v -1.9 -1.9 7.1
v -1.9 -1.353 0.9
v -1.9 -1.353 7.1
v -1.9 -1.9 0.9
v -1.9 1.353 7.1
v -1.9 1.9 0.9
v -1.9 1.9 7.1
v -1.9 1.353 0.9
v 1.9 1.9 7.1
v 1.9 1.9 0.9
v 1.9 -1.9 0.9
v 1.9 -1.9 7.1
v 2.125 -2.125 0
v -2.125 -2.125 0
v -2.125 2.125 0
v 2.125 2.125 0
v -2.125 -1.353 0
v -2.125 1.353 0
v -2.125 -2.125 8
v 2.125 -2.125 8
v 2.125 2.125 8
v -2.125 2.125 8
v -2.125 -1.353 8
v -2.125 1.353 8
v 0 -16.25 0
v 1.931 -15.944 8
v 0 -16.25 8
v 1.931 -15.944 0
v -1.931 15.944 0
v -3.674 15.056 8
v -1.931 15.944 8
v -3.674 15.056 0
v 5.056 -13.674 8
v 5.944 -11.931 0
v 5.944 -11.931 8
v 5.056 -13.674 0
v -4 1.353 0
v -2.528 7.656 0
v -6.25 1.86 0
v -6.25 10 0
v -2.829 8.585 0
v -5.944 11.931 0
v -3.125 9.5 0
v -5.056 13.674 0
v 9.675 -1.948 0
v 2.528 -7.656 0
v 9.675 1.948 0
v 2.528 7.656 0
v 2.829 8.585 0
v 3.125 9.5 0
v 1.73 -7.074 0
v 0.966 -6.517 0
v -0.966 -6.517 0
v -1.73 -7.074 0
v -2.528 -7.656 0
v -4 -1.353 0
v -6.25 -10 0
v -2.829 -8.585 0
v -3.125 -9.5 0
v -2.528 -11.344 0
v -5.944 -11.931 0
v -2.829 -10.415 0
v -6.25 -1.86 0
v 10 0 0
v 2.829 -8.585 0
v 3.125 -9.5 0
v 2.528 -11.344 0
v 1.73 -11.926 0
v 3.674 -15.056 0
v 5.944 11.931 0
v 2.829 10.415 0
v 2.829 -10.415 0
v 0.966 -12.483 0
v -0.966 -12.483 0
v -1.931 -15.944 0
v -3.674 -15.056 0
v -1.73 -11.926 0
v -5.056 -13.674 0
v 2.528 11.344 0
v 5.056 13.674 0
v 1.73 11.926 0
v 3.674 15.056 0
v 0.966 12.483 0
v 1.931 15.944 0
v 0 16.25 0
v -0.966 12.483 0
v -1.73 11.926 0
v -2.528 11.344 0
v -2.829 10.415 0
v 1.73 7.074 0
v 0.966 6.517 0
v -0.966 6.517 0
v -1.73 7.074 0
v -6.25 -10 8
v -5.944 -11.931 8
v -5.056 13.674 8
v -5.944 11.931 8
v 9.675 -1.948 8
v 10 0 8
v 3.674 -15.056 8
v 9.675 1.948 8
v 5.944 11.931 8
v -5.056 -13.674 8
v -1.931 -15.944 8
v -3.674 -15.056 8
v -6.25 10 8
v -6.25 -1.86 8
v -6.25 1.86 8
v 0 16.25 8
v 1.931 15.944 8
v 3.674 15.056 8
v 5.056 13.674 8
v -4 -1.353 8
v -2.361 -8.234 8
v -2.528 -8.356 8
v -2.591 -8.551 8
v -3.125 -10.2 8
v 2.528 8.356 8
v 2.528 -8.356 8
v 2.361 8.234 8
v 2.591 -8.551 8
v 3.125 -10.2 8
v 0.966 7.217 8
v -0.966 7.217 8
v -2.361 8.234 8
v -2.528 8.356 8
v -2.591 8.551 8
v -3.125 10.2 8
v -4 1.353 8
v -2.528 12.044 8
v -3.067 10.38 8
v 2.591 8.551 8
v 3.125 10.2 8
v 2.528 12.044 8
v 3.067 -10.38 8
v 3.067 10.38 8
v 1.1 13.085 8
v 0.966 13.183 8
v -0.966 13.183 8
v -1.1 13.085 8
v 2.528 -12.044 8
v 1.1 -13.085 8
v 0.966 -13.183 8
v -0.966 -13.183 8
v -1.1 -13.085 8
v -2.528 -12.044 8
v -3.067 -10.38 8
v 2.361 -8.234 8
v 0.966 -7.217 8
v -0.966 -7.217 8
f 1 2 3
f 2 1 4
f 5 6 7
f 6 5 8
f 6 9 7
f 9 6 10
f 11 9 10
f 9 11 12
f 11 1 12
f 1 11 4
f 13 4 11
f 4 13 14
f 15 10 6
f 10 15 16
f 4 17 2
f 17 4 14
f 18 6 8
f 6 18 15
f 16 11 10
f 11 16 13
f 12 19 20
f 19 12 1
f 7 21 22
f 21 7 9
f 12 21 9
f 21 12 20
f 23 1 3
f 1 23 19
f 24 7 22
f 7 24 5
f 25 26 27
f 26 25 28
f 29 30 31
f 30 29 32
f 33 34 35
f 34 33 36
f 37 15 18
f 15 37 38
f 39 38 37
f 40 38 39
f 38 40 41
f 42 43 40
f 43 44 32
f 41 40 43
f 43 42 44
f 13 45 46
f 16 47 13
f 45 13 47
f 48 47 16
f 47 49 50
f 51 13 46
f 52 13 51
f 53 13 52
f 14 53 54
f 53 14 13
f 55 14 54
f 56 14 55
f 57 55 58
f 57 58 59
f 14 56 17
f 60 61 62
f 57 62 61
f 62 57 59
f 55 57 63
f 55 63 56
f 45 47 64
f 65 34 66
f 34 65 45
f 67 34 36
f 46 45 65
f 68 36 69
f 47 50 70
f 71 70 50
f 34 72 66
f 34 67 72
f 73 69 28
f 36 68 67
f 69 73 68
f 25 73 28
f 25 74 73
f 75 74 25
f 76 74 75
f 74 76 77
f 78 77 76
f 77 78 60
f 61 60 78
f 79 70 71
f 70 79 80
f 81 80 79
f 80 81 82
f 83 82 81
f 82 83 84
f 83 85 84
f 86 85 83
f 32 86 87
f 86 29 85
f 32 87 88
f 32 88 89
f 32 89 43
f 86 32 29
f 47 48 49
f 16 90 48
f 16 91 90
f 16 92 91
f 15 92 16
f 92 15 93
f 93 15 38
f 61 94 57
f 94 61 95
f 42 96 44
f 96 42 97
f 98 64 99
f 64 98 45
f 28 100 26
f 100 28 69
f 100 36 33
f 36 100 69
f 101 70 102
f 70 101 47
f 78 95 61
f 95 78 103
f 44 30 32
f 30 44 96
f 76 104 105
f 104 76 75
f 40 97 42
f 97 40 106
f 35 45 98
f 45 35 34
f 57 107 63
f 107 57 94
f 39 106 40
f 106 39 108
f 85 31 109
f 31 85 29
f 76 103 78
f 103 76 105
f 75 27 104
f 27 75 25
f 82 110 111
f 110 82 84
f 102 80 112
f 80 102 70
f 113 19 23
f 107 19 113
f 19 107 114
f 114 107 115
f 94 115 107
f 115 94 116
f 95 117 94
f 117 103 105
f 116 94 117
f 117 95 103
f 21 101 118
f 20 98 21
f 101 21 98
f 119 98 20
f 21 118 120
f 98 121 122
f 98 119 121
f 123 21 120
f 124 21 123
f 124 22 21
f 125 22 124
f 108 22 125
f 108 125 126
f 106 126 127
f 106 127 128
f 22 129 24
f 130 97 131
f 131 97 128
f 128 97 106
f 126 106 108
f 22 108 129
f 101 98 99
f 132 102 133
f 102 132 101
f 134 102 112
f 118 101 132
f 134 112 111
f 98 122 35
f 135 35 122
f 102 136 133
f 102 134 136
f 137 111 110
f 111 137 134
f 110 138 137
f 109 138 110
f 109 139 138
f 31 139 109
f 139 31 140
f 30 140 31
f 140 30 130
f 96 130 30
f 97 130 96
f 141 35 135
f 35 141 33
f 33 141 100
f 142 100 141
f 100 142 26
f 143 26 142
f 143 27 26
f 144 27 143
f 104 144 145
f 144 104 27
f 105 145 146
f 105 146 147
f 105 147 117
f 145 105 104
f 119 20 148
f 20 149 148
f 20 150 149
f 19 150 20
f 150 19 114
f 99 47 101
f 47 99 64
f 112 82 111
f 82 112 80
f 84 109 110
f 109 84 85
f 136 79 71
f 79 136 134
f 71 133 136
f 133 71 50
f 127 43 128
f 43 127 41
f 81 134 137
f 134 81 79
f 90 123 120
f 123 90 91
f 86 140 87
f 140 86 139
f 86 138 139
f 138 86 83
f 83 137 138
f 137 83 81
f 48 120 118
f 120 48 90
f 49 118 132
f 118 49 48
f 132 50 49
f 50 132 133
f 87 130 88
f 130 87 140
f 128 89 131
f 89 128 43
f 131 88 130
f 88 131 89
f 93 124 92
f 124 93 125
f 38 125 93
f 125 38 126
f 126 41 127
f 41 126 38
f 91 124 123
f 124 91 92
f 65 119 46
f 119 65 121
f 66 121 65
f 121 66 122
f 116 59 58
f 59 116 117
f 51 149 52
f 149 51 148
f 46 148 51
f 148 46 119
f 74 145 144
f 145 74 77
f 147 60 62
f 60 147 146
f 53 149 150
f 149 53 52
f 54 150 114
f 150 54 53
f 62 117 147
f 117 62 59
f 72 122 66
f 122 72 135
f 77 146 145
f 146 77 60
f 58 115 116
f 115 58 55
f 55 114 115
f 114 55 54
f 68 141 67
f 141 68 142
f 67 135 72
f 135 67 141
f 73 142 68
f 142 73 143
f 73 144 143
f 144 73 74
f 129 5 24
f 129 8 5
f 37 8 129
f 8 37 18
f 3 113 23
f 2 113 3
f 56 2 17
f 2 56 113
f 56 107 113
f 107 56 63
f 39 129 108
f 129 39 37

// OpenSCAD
module nipple(d=3.3) {
    cylinder(d=d/cos(180/4), $fn=4, h=8, center=false);
    translate([0,0,-0.1]) cylinder(d2=d/cos(180/4), d1=(d+0.5)/cos(180/4), $fn=4, h=1, center=false);
    translate([0,0,7.1]) cylinder(d1=d/cos(180/4), d2=(d+0.5)/cos(180/4), $fn=4, h=1, center=false);

}

module spoke(d=2.5) {
    cylinder(d=d/cos(180/8), h=200, center=false, $fn=8);
}

rotate([0,0,0]) difference() {
    union() {
        rotate([0,-90,0]) {
            rotate([0,90,0]) cylinder(d=12.1, h=6, center=false);
            hull() {
                rotate([0,90,0]) translate([0,0,6]) cylinder(d=12.1, h=0.1, center=false);
                translate([25,0,2]) {
                    translate([0,12.5,0]) cylinder(d=12.5, h=5, center=true);
                    translate([0,-12.5,0]) cylinder(d=12.5, h=5, center=true);
                }
                *translate([21,0,1]) {
                    cylinder(d=35, h=1, center=false);
                    translate([0,0,1]) cylinder(d=37, h=3, center=false);
                    translate([0,0,4]) cylinder(d=35, h=1, center=false);
                }
            }
        }
    }
    rotate([0,0,45]) nipple(3.8);
    hull() {
        translate([4,0,-0.10]) spoke();
        spoke();
    }
    hull() {
        translate([4,0,-0.10]) spoke();
        translate([7.5,0,-0.10]) scale([2,2,1]) spoke();
    }

}
!rotate([0,0,0]) difference() {
    union() {
            hull() {
                cylinder(d=12.5, h=8, center=false);
                translate([0,10,0]) {
                    cylinder(d=12.5, h=8, center=false);
                    }
                translate([4,0,0]) {
                    cylinder(d=12, h=8, center=false);
                    }
                translate([0,-10,0]) {
                    cylinder(d=12.5, h=8, center=false);
                    }
                }
            }
                translate([0,9.5,0]) {
                    rotate([-5,0,0]) cylinder(d=6.25, h=20, center=true);
                    }
                translate([0,-9.5,0]) {
                    rotate([5,0,0]) cylinder(d=6.25, h=20, center=true);
                    }
    rotate([0,0,45]) nipple(3.8);
    hull() {
        translate([-4,0,-0.10]) spoke();
        spoke();
    }
    hull() {
        translate([-4,0,-0.10]) spoke();
        translate([-10,0,-0.10]) scale([2,2,1]) spoke();
    }

}
